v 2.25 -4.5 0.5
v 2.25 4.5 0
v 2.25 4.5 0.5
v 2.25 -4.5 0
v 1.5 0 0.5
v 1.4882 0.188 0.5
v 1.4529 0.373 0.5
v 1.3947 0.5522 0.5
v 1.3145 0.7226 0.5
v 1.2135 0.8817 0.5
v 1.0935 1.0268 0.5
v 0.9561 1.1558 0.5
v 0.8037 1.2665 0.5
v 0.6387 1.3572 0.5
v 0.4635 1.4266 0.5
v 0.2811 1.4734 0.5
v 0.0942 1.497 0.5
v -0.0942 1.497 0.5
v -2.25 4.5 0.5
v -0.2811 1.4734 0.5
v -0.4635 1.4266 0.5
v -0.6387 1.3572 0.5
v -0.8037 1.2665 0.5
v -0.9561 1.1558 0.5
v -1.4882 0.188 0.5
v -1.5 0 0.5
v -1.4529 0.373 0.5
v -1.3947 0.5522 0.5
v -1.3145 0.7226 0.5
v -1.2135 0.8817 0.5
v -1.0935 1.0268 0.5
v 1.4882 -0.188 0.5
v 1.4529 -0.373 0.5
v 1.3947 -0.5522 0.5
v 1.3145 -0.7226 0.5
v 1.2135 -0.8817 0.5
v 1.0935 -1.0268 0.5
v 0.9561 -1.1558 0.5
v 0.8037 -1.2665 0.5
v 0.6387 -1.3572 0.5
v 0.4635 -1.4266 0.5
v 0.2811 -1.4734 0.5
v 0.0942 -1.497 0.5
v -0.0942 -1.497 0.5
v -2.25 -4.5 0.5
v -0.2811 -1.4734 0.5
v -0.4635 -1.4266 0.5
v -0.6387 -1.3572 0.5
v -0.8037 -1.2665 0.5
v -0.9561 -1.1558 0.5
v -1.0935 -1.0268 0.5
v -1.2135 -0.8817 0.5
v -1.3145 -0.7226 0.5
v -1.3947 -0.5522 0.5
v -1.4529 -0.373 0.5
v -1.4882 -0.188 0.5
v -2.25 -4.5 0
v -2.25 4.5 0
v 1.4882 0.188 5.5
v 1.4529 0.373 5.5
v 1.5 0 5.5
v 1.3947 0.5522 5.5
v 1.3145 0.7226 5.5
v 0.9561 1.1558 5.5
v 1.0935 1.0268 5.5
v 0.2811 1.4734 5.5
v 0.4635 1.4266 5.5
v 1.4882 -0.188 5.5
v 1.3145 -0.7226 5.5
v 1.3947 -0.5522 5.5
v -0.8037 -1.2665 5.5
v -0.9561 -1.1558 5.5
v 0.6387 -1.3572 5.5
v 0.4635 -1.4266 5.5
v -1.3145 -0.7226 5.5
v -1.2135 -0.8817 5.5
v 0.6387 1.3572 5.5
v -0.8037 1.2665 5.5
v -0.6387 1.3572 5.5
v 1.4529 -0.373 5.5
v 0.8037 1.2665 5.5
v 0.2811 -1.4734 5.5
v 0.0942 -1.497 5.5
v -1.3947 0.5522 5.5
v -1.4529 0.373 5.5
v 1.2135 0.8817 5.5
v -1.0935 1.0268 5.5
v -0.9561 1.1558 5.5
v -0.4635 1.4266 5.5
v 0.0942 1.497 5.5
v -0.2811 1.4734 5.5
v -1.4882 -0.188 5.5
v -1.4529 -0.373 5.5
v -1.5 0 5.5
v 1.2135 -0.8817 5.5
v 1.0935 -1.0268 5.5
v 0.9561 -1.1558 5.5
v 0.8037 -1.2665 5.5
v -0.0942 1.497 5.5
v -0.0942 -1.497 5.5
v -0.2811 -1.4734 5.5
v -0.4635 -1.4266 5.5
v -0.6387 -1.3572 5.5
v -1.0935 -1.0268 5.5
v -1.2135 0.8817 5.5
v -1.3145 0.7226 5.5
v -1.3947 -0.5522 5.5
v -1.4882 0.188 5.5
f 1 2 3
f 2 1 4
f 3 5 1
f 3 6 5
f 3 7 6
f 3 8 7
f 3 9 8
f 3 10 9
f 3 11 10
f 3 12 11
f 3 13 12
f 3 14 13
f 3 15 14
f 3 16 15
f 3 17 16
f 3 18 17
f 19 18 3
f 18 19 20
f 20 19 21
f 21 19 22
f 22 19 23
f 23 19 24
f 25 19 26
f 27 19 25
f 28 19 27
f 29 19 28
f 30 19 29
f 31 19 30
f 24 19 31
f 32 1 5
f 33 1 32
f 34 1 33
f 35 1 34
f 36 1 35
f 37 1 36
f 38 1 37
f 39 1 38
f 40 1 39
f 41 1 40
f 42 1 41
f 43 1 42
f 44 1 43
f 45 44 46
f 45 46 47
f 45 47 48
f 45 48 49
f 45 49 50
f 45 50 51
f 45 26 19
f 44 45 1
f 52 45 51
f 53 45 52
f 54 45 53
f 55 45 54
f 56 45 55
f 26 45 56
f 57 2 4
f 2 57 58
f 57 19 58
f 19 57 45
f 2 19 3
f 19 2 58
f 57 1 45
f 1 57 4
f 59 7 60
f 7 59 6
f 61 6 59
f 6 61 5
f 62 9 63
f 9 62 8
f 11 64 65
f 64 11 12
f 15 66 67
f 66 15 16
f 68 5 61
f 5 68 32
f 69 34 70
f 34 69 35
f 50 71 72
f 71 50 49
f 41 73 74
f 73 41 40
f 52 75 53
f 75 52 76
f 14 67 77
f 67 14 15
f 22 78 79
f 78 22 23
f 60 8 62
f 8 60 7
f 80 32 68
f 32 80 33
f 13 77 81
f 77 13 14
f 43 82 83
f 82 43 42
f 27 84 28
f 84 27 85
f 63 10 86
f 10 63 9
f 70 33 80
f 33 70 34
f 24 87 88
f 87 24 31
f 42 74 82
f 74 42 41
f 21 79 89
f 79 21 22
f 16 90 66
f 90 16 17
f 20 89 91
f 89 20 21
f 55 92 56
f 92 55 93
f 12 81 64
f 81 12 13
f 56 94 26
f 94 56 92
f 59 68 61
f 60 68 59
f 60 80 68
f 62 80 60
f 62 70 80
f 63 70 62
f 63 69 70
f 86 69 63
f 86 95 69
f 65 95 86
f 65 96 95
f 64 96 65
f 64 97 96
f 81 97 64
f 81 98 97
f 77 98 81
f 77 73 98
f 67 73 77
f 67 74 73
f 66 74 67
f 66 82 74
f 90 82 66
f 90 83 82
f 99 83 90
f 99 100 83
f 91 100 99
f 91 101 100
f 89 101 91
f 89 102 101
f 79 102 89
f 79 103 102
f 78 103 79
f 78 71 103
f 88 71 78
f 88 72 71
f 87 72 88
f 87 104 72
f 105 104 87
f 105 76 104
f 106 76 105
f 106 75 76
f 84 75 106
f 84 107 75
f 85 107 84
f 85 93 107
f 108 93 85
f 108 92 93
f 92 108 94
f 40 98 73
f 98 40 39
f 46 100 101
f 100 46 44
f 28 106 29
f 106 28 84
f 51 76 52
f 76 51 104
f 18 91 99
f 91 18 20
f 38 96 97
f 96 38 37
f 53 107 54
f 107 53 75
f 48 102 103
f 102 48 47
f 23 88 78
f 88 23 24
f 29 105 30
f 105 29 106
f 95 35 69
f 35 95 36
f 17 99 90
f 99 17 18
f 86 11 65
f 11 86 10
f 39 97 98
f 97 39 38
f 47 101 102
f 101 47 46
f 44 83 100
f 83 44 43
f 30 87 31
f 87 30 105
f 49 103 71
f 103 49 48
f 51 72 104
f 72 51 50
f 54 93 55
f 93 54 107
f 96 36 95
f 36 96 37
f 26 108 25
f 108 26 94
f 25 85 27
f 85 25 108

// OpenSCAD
$fa = 1;
$fs = 0.5;
$fn = 50;

translate([-2.25,-4.5,0]) cube([4.5,9,0.5]);
cylinder(h=5.5,r=1.5);
